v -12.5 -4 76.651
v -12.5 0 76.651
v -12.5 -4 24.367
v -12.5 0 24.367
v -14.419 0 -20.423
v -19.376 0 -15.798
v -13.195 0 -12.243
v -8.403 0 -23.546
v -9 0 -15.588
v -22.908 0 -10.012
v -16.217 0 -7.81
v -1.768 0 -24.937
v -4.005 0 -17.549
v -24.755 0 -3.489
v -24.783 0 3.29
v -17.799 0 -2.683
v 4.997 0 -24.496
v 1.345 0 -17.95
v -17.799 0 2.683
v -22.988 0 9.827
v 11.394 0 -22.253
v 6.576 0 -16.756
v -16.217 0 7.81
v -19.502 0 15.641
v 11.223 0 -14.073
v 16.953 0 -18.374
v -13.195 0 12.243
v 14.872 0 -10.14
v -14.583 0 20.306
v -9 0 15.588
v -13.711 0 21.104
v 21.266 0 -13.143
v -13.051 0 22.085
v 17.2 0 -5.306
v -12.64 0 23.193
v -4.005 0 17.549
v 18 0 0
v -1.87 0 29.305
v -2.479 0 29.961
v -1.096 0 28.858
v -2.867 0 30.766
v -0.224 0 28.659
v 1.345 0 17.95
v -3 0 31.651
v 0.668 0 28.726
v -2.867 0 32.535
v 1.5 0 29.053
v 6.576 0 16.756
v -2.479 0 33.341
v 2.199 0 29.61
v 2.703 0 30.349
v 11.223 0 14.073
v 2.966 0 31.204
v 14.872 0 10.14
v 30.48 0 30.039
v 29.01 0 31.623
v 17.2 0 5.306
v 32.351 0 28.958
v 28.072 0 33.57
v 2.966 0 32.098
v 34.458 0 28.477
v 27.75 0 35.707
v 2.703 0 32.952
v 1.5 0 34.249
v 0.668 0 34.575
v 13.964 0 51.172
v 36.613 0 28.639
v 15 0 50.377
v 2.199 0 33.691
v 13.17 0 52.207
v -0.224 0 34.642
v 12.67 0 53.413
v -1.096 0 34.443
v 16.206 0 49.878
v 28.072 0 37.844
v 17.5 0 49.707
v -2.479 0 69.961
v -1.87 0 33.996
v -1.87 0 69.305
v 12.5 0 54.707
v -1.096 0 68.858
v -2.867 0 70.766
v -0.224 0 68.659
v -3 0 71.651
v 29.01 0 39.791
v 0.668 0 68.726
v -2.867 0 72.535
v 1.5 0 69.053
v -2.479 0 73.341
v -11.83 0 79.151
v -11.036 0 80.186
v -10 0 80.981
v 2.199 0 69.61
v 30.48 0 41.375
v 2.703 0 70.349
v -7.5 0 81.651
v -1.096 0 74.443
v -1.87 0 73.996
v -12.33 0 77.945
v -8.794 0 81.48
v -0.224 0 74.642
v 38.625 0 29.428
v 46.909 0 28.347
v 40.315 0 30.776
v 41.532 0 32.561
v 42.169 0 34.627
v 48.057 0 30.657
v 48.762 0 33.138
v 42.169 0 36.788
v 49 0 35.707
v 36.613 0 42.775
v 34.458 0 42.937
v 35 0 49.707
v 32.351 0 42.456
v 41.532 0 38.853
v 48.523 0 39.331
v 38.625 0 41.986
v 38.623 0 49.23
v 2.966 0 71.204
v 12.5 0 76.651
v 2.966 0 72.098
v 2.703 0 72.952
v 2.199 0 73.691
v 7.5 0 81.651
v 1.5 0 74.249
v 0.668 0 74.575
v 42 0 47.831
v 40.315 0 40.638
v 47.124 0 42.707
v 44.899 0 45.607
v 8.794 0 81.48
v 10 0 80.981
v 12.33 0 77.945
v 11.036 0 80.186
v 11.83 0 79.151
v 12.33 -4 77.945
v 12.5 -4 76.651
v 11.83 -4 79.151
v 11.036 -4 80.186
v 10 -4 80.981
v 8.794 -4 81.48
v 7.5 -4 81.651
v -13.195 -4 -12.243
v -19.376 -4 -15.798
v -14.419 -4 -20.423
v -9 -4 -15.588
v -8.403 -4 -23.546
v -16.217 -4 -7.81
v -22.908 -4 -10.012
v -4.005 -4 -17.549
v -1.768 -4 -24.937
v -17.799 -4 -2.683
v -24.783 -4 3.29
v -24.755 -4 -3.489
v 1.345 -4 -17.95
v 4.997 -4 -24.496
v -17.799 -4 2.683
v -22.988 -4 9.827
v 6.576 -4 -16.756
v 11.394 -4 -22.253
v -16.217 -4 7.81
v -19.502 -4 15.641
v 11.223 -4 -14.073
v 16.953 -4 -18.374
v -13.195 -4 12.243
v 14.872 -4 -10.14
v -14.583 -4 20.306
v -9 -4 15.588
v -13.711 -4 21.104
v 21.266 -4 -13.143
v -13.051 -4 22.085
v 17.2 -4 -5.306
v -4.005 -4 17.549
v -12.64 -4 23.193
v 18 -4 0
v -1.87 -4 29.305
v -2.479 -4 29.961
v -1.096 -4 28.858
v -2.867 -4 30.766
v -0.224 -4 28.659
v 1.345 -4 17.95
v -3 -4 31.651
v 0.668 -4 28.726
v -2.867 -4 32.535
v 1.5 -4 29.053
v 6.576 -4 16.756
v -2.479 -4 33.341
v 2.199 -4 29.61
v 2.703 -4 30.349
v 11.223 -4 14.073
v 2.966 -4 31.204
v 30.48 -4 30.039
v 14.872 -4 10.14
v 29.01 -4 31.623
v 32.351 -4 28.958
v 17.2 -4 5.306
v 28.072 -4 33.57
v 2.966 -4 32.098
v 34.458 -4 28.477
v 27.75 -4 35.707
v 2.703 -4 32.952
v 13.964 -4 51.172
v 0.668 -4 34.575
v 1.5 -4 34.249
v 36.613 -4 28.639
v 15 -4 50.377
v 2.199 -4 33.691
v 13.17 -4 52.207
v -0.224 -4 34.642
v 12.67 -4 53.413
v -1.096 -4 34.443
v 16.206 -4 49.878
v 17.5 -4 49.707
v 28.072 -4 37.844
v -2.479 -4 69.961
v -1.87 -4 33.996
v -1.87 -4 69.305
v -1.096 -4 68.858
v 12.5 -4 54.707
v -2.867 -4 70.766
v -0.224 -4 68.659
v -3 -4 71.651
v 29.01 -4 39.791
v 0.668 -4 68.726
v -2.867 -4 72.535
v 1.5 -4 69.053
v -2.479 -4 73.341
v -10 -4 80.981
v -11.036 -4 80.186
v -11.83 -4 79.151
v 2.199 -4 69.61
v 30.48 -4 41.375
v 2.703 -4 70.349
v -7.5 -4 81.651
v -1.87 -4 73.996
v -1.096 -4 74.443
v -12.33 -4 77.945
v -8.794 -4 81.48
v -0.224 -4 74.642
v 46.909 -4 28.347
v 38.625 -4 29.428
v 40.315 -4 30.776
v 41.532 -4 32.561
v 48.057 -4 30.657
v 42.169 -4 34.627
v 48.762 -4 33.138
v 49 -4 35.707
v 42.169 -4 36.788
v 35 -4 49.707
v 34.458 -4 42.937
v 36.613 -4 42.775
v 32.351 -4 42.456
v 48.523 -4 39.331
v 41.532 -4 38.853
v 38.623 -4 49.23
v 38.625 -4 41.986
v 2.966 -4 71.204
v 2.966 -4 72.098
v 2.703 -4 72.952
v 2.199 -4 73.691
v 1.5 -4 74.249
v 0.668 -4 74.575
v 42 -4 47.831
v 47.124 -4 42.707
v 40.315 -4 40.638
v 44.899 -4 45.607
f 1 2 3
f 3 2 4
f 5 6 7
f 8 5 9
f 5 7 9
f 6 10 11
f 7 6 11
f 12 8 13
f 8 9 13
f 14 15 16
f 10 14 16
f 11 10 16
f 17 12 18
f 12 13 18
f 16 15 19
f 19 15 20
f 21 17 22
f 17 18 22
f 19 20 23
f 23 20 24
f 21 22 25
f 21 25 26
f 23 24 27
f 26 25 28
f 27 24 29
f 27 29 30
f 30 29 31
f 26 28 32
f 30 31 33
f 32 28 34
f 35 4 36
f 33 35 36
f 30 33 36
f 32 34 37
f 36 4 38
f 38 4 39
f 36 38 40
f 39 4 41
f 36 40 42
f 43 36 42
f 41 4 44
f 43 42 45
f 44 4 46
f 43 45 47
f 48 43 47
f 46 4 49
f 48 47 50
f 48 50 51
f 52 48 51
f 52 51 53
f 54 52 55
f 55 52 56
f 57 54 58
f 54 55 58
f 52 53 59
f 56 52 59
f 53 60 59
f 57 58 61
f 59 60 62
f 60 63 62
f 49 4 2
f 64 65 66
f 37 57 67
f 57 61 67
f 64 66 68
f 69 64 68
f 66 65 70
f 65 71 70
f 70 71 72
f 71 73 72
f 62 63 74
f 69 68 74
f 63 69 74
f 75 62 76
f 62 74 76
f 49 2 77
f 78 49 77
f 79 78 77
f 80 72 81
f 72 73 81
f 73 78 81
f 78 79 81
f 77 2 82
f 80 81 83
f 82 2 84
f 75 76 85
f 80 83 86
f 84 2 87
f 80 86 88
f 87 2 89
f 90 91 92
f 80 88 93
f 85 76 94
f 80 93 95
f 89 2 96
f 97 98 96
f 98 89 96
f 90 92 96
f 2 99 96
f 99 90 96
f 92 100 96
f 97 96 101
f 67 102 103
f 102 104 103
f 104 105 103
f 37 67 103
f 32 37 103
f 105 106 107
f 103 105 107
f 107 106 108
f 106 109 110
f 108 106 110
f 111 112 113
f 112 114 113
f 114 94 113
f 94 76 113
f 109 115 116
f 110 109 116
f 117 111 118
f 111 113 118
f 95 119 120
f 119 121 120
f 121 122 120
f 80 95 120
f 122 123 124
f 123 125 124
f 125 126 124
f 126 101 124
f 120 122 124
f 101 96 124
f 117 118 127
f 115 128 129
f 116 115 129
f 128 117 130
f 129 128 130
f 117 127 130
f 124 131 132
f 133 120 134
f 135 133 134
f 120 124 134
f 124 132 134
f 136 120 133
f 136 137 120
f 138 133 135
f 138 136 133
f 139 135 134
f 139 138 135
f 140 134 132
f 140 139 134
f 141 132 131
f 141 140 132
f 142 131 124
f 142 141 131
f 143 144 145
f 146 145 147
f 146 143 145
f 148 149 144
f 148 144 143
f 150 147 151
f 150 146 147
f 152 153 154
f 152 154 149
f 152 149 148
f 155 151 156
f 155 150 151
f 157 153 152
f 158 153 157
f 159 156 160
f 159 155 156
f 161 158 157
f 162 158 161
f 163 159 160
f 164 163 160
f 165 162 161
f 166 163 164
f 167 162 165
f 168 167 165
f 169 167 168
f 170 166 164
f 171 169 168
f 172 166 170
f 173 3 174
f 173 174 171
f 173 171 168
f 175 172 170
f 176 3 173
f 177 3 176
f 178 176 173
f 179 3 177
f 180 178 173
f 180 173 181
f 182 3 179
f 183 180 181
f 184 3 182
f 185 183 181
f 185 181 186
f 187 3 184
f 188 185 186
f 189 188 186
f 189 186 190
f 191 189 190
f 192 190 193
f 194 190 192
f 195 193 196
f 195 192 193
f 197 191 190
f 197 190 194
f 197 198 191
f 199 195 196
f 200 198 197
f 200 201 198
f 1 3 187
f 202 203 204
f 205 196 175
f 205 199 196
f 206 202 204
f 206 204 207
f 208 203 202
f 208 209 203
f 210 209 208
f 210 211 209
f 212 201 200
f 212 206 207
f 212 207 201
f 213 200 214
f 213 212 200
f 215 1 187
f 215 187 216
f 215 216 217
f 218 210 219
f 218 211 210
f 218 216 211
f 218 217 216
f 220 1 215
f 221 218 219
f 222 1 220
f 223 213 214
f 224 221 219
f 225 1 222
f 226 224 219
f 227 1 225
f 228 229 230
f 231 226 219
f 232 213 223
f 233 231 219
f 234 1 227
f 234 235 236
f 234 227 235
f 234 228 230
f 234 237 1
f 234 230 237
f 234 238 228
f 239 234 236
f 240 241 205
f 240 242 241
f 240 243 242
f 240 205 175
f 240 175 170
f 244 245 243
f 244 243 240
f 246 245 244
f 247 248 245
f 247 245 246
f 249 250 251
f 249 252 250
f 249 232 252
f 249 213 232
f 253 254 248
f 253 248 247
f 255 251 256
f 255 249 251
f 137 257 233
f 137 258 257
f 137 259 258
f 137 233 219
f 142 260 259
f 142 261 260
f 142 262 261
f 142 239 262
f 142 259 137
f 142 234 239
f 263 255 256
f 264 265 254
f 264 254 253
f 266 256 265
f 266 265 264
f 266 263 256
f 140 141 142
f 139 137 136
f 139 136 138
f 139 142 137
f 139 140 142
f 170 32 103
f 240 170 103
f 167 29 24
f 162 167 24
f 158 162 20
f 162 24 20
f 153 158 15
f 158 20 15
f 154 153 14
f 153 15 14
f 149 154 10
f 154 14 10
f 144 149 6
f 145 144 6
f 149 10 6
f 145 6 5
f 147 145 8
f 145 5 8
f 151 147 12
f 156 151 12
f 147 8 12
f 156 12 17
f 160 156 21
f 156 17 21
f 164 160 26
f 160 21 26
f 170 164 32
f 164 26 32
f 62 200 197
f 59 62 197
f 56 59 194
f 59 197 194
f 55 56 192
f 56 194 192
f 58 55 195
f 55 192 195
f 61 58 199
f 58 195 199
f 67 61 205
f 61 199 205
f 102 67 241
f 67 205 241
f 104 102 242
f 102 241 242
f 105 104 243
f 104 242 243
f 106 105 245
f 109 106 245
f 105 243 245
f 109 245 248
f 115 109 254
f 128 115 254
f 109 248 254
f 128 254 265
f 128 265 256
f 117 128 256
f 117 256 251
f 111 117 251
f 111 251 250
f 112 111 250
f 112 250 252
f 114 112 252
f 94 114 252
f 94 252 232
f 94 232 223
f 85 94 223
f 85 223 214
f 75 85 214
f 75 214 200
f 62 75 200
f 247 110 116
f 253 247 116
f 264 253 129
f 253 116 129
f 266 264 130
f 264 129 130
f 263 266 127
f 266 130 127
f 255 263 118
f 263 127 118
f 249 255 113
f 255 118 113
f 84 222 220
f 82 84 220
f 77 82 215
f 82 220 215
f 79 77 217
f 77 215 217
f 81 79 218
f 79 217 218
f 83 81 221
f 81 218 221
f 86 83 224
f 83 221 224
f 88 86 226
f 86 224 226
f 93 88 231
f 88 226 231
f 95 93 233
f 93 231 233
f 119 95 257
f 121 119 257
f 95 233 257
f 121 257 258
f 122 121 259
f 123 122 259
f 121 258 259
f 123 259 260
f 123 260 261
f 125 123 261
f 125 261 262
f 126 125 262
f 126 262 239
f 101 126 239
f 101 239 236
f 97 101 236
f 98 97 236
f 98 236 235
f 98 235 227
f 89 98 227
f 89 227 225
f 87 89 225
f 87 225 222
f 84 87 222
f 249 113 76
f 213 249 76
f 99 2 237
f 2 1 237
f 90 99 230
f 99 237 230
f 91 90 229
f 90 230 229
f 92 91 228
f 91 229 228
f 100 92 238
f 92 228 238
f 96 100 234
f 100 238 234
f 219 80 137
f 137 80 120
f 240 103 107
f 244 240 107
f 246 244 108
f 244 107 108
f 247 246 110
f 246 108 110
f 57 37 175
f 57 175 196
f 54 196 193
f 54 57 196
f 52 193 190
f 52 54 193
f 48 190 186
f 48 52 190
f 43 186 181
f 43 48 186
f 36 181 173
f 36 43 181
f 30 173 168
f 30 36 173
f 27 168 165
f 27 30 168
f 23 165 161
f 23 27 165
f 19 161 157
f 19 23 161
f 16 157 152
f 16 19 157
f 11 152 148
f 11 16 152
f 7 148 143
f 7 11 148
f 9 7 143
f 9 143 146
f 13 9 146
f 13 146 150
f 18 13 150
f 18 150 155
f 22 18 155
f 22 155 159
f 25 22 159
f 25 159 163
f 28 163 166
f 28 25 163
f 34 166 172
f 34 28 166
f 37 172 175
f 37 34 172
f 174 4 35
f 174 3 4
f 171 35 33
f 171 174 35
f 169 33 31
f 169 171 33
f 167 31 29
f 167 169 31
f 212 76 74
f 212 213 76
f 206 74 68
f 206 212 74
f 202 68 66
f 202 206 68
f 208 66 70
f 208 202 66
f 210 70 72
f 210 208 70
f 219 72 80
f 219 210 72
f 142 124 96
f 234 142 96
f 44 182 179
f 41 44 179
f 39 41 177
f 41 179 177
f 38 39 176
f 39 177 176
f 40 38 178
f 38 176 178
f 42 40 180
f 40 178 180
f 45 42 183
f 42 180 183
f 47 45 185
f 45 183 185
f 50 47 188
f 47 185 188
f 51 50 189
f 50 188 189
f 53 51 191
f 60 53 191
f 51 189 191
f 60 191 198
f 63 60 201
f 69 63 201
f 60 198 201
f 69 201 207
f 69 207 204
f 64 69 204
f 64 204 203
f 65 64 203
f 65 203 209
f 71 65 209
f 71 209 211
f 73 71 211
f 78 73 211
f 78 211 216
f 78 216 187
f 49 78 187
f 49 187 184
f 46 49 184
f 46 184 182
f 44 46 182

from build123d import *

# Parameters (mm, degrees)
F0_R     = 18
F1_DEPTH = 4
F2_R     = 5
F3_D     = 6
F4_D     = 14.5


with BuildPart() as f1:
    # F0 (on Front) → F1 (new body)
    with BuildSketch(Plane.XZ):
        with BuildLine():
            Line((-12.5, 81.6506350946), (-12.5, 21.6506350946))
            ThreePointArc((-12.5, 21.6506350946), (-17.9406988245, -17.4106670087), (21.2661562924, -13.1434621219))
            ThreePointArc((21.2661562924, -13.1434621219), (24.242434448, 6.1077305141), (12.5, 21.6506350946))
            Line((12.5, 21.6506350946), (12.5, 49.7071421427))
            Line((12.5, 49.7071421427), (12.5, 81.6506350946))
            Line((12.5, 81.6506350946), (-12.5, 81.6506350946))
        make_face()
        Circle(F0_R, mode=Mode.SUBTRACT)
        with BuildLine():
            ThreePointArc((12.5, 21.6506350946), (24.242434448, 6.1077305141), (21.2661562924, -13.1434621219))
            Line((21.2661562924, -13.1434621219), (46.9090475237, 28.3468033545))
            ThreePointArc((46.9090475237, 28.3468033545), (22.7720659342, 28.8896918508), (35, 49.7071421427))
            Line((35, 49.7071421427), (12.5, 49.7071421427))
            Line((12.5, 49.7071421427), (12.5, 21.6506350946))
        make_face()
        with BuildLine():
            ThreePointArc((35, 49.7071421427), (22.7720659342, 28.8896918508), (46.9090475237, 28.3468033545))
            ThreePointArc((46.9090475237, 28.3468033545), (48.4671204296, 31.8813523767), (49, 35.7071421427))
            ThreePointArc((49, 35.7071421427), (44.8994949366, 45.6066370793), (35, 49.7071421427))
        make_face()
    extrude(amount=F1_DEPTH)

    # F2
    f2_edges = [f1.edges().sort_by_distance(p)[0] for p in [
        (12.5, -2, 81.650635),
        (12.5, -2, 49.707142),
        (21.266156, -2, -13.143462),
        (-12.5, -2, 21.650635),
        (-12.5, -2, 81.650635),
    ]]
    fillet(f2_edges, radius=F2_R)

    # F3 (through all)
    with Locations(Plane(origin=(0, 0, 0), x_dir=(1, 0, 0), z_dir=(0, 1, 0))):
        with Locations((0, -31.6506350946), (0, -71.6506350946)):
            Hole(F3_D / 2)

    # F4 (through all)
    with Locations(Plane(origin=(0, 0, 0), x_dir=(1, 0, 0), z_dir=(0, 1, 0))):
        with Locations((35, -35.7071421427)):
            Hole(F4_D / 2)


solid = f1.part
